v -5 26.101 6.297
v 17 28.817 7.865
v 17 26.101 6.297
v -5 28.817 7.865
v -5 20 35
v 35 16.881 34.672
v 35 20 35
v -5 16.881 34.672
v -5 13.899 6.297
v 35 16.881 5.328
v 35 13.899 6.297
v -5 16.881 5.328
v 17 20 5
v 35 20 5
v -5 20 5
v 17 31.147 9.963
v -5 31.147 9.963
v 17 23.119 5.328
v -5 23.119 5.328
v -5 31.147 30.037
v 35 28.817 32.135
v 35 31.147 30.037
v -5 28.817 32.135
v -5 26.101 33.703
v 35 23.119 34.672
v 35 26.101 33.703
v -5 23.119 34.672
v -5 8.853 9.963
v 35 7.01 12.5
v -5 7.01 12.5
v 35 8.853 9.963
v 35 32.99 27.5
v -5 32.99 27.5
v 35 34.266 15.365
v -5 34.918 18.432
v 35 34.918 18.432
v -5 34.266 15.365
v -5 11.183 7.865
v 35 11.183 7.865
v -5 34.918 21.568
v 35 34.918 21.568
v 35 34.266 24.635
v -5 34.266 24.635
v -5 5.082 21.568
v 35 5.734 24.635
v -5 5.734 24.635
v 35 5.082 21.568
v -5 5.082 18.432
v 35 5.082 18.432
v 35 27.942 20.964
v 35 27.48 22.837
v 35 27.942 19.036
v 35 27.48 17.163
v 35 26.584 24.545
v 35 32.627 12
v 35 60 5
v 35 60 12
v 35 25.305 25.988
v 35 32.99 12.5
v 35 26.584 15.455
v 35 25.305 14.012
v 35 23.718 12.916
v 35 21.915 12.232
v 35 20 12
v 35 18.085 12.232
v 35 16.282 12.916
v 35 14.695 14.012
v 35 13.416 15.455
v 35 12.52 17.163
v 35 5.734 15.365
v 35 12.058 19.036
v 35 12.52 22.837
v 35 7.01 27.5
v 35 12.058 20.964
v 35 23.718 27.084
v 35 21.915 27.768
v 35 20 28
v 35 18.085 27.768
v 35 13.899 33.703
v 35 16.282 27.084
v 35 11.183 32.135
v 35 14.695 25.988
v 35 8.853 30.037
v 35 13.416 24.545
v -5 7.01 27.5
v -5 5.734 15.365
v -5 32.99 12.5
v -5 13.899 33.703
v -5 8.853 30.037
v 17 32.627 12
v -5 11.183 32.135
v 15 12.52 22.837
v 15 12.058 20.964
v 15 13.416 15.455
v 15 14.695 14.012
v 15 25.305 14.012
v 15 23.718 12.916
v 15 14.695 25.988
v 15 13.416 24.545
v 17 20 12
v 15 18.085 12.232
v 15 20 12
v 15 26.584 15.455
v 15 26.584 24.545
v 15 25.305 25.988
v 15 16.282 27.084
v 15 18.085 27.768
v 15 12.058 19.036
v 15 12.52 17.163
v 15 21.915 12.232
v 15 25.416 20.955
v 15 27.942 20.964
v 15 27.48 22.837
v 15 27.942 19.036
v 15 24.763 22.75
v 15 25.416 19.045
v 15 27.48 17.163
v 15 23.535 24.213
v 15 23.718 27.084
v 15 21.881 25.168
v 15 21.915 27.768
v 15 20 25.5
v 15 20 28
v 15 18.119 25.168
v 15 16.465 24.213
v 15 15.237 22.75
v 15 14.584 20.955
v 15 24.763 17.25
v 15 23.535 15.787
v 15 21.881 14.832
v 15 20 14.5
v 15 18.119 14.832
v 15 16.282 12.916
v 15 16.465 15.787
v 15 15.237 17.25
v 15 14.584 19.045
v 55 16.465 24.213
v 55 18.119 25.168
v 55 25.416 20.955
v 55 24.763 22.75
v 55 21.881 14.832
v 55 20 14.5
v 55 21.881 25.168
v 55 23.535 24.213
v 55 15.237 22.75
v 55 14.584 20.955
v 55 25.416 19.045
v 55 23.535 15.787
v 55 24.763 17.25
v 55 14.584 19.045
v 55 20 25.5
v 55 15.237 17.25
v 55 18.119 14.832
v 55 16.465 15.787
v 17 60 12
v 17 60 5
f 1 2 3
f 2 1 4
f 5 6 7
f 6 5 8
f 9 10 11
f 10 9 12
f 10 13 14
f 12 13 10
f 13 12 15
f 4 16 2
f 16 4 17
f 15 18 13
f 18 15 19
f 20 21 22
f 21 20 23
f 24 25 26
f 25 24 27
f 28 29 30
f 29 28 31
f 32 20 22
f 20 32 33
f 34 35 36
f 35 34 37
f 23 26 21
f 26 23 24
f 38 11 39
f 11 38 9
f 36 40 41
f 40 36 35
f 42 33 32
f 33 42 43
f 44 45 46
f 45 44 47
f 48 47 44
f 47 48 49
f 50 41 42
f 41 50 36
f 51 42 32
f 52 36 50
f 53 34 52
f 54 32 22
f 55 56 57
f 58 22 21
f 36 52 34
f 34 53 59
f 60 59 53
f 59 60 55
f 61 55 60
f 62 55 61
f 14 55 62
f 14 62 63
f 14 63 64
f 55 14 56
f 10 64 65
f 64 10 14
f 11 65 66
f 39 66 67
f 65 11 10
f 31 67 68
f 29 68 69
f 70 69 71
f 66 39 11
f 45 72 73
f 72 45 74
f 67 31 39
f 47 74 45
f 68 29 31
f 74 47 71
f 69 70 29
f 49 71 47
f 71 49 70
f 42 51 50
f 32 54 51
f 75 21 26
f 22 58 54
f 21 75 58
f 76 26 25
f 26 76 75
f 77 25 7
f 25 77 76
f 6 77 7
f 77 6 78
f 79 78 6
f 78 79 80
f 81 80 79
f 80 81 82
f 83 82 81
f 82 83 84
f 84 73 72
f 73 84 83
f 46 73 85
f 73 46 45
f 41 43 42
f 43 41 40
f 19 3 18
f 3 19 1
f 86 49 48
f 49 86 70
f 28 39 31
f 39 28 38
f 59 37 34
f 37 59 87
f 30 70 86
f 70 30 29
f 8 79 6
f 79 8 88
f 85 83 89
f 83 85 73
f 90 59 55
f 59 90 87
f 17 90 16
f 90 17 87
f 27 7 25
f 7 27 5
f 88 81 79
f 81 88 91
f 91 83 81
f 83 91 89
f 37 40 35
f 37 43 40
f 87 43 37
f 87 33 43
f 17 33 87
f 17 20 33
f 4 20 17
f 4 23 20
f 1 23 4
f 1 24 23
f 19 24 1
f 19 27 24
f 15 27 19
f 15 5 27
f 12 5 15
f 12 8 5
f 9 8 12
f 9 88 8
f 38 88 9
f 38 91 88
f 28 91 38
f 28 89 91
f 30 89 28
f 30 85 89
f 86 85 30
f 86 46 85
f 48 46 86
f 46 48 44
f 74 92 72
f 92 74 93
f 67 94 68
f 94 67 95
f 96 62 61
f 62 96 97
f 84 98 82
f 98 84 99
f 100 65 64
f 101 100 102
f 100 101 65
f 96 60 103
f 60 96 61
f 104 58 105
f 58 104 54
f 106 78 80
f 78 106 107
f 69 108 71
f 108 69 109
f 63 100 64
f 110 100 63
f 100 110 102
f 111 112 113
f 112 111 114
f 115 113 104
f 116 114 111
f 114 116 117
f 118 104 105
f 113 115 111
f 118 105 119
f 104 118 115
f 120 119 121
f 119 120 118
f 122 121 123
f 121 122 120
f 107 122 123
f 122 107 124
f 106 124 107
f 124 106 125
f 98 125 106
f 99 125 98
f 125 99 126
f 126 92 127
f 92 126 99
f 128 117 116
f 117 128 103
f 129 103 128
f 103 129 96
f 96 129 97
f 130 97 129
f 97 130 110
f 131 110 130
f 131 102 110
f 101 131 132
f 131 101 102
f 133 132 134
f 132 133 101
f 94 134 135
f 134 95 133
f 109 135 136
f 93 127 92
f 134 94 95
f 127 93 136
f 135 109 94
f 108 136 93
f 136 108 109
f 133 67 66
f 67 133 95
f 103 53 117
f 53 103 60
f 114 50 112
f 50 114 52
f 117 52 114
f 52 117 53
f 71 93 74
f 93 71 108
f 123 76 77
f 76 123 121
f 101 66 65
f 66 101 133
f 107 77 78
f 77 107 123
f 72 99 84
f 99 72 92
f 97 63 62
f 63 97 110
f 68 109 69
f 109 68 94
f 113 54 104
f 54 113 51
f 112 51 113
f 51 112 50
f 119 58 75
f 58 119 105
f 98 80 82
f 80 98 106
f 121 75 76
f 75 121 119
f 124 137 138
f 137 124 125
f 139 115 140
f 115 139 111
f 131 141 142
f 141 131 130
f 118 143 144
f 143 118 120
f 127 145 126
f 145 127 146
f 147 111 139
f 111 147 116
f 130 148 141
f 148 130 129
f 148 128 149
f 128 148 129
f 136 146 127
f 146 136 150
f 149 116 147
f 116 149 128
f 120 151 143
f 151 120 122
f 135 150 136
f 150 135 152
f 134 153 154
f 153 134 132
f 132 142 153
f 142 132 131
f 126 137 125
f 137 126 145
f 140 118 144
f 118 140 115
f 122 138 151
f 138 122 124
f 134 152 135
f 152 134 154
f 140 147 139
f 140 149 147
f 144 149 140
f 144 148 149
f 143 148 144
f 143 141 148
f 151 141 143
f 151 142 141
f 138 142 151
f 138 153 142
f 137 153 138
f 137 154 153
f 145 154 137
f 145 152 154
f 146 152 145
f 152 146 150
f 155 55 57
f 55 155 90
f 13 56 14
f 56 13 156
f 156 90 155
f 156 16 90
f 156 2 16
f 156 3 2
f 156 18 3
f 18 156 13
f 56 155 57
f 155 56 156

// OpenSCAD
module exa_cyclone()
{
   union() {
      translate([17,20,5]) cube(size = [18,40,7], center = false);
      translate([0,20,20]){
         union() {
            difference() {
               translate([15,0,0]) rotate(a=[0,90,0]) cylinder(40, 15, 15, center = true);
               translate([35,0,0]) rotate(a=[0,90,0]) cylinder(40, 8, 8, center = true);
            }
            translate([35,0,0]) rotate(a=[0,90,0]) cylinder(40, 5.5, 5.5, center = true);
         }
      }
   }
}
exa_cyclone();
